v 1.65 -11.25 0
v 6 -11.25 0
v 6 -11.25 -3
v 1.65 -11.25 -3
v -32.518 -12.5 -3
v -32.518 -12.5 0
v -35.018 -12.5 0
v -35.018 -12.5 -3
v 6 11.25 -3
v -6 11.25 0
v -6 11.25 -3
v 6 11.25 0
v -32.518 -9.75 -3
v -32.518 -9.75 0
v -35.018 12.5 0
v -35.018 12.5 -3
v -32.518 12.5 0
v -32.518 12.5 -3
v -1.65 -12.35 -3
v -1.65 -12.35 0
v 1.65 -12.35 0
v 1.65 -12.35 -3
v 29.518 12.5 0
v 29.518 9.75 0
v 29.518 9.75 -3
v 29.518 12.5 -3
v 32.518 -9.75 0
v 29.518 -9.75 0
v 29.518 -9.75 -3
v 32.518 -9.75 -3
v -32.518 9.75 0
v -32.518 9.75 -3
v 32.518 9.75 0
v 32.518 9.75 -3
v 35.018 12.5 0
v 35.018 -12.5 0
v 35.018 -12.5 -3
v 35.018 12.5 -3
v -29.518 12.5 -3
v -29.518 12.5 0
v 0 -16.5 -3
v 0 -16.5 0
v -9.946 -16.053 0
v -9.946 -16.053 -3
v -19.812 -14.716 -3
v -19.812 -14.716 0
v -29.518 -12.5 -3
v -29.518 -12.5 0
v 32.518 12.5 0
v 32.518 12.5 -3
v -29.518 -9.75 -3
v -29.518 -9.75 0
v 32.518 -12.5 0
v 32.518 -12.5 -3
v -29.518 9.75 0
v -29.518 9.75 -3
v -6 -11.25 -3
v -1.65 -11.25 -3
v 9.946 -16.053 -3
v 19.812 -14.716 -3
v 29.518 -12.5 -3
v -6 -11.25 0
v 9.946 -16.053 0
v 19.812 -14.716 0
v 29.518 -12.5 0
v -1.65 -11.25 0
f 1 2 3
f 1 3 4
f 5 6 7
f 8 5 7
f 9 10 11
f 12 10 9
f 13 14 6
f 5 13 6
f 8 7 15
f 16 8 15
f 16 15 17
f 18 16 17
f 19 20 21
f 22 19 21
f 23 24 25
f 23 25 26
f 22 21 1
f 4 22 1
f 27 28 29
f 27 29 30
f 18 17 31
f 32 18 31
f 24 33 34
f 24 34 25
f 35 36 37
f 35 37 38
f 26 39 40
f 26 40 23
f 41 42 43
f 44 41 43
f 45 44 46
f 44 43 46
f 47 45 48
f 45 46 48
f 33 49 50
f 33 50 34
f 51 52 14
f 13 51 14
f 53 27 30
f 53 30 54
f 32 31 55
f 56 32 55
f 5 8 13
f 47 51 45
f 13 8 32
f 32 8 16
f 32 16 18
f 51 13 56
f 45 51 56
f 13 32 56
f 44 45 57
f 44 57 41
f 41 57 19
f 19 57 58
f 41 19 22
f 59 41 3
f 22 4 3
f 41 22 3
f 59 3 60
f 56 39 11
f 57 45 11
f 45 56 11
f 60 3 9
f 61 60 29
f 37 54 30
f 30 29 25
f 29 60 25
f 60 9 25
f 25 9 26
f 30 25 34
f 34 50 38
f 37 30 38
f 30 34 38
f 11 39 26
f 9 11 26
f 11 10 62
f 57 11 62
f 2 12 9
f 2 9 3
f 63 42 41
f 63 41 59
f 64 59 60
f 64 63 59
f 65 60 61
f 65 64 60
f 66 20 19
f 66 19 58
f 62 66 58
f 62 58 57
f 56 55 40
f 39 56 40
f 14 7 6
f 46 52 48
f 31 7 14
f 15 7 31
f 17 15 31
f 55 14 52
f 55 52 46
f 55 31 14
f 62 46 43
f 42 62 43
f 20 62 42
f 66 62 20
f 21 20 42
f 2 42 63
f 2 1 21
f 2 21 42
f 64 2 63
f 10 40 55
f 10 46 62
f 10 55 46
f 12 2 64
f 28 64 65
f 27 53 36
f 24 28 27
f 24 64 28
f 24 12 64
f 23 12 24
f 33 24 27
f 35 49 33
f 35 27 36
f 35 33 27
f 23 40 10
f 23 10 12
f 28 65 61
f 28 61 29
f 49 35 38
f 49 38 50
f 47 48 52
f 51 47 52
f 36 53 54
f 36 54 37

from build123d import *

# Parameters (mm, degrees)
AUFSATZ_LINEAR_AUSTRAGEN1_DEPTH      = 3
SCHNITT_LINEAR_AUSTRAGEN2_DEPTH      = 39.826708727
SCHNITT_LINEAR_AUSTRAGEN2_DEPTH_BACK = 39.826708727
SKIZZE5_W                            = 3.3
SKIZZE5_H                            = 1.1
SCHNITT_LINEAR_AUSTRAGEN3_DEPTH      = 10


with BuildPart() as part:
    # Skizze1 → Aufsatz-Linear austragen1 (new body)
    with BuildSketch(Plane.XY):
        with BuildLine():
            Line((-6, -11.25), (0, -11.25))
            Line((0, -11.25), (0, -16.5))
            ThreePointArc((0, -16.5), (-14.893915213, -15.49545091), (-29.518042644, -12.5))
            Line((-29.518042644, -12.5), (-29.518042644, -9.75))
            Line((-29.518042644, -9.75), (-32.518042644, -9.75))
            Line((-32.518042644, -9.75), (-32.518042644, -12.5))
            Line((-32.518042644, -12.5), (-35.018042644, -12.5))
            Line((-35.018042644, -12.5), (-35.018042644, 12.5))
            Line((-35.018042644, 12.5), (-32.518042644, 12.5))
            Line((-32.518042644, 12.5), (-32.518042644, 9.75))
            Line((-32.518042644, 9.75), (-29.518042644, 9.75))
            Line((-29.518042644, 9.75), (-29.518042644, 12.5))
            ThreePointArc((-29.518042644, 12.5), (-14.893915213, 15.49545091), (0, 16.5))
            Line((0, 16.5), (0, 11.25))
            Line((0, 11.25), (-6, 11.25))
            Line((-6, 11.25), (-6, -11.25))
        make_face()
    aufsatz_linear_austragen1 = extrude(amount=-AUFSATZ_LINEAR_AUSTRAGEN1_DEPTH)

    # Spiegeln1: Aufsatz-Linear austragen1 across plane
    add(aufsatz_linear_austragen1.mirror(Plane(origin=(0, 0, 0), x_dir=(0, 0, 1), z_dir=(1, 0, 0))))

    # Skizze2 → Schnitt-Linear austragen2 (cut, two sides: drawn at the far end of the back side and taken through both)
    with BuildSketch(Plane.XY.offset(-SCHNITT_LINEAR_AUSTRAGEN2_DEPTH_BACK)):
        Polygon((181.022901985, 12.5), (29.518042644, 12.5), (-29.518042644, 12.5), (-181.022901985, 12.5), (-181.022901985, 315.509718682), (181.022901985, 315.509718682), align=None)
    extrude(amount=SCHNITT_LINEAR_AUSTRAGEN2_DEPTH + SCHNITT_LINEAR_AUSTRAGEN2_DEPTH_BACK, mode=Mode.SUBTRACT)

    # Skizze5 → Schnitt-Linear austragen3 (cut)
    with BuildSketch(Plane.XY):
        with Locations((0, -11.8)):
            Rectangle(SKIZZE5_W, SKIZZE5_H)
    extrude(amount=-SCHNITT_LINEAR_AUSTRAGEN3_DEPTH, mode=Mode.SUBTRACT)


solid = part.part
